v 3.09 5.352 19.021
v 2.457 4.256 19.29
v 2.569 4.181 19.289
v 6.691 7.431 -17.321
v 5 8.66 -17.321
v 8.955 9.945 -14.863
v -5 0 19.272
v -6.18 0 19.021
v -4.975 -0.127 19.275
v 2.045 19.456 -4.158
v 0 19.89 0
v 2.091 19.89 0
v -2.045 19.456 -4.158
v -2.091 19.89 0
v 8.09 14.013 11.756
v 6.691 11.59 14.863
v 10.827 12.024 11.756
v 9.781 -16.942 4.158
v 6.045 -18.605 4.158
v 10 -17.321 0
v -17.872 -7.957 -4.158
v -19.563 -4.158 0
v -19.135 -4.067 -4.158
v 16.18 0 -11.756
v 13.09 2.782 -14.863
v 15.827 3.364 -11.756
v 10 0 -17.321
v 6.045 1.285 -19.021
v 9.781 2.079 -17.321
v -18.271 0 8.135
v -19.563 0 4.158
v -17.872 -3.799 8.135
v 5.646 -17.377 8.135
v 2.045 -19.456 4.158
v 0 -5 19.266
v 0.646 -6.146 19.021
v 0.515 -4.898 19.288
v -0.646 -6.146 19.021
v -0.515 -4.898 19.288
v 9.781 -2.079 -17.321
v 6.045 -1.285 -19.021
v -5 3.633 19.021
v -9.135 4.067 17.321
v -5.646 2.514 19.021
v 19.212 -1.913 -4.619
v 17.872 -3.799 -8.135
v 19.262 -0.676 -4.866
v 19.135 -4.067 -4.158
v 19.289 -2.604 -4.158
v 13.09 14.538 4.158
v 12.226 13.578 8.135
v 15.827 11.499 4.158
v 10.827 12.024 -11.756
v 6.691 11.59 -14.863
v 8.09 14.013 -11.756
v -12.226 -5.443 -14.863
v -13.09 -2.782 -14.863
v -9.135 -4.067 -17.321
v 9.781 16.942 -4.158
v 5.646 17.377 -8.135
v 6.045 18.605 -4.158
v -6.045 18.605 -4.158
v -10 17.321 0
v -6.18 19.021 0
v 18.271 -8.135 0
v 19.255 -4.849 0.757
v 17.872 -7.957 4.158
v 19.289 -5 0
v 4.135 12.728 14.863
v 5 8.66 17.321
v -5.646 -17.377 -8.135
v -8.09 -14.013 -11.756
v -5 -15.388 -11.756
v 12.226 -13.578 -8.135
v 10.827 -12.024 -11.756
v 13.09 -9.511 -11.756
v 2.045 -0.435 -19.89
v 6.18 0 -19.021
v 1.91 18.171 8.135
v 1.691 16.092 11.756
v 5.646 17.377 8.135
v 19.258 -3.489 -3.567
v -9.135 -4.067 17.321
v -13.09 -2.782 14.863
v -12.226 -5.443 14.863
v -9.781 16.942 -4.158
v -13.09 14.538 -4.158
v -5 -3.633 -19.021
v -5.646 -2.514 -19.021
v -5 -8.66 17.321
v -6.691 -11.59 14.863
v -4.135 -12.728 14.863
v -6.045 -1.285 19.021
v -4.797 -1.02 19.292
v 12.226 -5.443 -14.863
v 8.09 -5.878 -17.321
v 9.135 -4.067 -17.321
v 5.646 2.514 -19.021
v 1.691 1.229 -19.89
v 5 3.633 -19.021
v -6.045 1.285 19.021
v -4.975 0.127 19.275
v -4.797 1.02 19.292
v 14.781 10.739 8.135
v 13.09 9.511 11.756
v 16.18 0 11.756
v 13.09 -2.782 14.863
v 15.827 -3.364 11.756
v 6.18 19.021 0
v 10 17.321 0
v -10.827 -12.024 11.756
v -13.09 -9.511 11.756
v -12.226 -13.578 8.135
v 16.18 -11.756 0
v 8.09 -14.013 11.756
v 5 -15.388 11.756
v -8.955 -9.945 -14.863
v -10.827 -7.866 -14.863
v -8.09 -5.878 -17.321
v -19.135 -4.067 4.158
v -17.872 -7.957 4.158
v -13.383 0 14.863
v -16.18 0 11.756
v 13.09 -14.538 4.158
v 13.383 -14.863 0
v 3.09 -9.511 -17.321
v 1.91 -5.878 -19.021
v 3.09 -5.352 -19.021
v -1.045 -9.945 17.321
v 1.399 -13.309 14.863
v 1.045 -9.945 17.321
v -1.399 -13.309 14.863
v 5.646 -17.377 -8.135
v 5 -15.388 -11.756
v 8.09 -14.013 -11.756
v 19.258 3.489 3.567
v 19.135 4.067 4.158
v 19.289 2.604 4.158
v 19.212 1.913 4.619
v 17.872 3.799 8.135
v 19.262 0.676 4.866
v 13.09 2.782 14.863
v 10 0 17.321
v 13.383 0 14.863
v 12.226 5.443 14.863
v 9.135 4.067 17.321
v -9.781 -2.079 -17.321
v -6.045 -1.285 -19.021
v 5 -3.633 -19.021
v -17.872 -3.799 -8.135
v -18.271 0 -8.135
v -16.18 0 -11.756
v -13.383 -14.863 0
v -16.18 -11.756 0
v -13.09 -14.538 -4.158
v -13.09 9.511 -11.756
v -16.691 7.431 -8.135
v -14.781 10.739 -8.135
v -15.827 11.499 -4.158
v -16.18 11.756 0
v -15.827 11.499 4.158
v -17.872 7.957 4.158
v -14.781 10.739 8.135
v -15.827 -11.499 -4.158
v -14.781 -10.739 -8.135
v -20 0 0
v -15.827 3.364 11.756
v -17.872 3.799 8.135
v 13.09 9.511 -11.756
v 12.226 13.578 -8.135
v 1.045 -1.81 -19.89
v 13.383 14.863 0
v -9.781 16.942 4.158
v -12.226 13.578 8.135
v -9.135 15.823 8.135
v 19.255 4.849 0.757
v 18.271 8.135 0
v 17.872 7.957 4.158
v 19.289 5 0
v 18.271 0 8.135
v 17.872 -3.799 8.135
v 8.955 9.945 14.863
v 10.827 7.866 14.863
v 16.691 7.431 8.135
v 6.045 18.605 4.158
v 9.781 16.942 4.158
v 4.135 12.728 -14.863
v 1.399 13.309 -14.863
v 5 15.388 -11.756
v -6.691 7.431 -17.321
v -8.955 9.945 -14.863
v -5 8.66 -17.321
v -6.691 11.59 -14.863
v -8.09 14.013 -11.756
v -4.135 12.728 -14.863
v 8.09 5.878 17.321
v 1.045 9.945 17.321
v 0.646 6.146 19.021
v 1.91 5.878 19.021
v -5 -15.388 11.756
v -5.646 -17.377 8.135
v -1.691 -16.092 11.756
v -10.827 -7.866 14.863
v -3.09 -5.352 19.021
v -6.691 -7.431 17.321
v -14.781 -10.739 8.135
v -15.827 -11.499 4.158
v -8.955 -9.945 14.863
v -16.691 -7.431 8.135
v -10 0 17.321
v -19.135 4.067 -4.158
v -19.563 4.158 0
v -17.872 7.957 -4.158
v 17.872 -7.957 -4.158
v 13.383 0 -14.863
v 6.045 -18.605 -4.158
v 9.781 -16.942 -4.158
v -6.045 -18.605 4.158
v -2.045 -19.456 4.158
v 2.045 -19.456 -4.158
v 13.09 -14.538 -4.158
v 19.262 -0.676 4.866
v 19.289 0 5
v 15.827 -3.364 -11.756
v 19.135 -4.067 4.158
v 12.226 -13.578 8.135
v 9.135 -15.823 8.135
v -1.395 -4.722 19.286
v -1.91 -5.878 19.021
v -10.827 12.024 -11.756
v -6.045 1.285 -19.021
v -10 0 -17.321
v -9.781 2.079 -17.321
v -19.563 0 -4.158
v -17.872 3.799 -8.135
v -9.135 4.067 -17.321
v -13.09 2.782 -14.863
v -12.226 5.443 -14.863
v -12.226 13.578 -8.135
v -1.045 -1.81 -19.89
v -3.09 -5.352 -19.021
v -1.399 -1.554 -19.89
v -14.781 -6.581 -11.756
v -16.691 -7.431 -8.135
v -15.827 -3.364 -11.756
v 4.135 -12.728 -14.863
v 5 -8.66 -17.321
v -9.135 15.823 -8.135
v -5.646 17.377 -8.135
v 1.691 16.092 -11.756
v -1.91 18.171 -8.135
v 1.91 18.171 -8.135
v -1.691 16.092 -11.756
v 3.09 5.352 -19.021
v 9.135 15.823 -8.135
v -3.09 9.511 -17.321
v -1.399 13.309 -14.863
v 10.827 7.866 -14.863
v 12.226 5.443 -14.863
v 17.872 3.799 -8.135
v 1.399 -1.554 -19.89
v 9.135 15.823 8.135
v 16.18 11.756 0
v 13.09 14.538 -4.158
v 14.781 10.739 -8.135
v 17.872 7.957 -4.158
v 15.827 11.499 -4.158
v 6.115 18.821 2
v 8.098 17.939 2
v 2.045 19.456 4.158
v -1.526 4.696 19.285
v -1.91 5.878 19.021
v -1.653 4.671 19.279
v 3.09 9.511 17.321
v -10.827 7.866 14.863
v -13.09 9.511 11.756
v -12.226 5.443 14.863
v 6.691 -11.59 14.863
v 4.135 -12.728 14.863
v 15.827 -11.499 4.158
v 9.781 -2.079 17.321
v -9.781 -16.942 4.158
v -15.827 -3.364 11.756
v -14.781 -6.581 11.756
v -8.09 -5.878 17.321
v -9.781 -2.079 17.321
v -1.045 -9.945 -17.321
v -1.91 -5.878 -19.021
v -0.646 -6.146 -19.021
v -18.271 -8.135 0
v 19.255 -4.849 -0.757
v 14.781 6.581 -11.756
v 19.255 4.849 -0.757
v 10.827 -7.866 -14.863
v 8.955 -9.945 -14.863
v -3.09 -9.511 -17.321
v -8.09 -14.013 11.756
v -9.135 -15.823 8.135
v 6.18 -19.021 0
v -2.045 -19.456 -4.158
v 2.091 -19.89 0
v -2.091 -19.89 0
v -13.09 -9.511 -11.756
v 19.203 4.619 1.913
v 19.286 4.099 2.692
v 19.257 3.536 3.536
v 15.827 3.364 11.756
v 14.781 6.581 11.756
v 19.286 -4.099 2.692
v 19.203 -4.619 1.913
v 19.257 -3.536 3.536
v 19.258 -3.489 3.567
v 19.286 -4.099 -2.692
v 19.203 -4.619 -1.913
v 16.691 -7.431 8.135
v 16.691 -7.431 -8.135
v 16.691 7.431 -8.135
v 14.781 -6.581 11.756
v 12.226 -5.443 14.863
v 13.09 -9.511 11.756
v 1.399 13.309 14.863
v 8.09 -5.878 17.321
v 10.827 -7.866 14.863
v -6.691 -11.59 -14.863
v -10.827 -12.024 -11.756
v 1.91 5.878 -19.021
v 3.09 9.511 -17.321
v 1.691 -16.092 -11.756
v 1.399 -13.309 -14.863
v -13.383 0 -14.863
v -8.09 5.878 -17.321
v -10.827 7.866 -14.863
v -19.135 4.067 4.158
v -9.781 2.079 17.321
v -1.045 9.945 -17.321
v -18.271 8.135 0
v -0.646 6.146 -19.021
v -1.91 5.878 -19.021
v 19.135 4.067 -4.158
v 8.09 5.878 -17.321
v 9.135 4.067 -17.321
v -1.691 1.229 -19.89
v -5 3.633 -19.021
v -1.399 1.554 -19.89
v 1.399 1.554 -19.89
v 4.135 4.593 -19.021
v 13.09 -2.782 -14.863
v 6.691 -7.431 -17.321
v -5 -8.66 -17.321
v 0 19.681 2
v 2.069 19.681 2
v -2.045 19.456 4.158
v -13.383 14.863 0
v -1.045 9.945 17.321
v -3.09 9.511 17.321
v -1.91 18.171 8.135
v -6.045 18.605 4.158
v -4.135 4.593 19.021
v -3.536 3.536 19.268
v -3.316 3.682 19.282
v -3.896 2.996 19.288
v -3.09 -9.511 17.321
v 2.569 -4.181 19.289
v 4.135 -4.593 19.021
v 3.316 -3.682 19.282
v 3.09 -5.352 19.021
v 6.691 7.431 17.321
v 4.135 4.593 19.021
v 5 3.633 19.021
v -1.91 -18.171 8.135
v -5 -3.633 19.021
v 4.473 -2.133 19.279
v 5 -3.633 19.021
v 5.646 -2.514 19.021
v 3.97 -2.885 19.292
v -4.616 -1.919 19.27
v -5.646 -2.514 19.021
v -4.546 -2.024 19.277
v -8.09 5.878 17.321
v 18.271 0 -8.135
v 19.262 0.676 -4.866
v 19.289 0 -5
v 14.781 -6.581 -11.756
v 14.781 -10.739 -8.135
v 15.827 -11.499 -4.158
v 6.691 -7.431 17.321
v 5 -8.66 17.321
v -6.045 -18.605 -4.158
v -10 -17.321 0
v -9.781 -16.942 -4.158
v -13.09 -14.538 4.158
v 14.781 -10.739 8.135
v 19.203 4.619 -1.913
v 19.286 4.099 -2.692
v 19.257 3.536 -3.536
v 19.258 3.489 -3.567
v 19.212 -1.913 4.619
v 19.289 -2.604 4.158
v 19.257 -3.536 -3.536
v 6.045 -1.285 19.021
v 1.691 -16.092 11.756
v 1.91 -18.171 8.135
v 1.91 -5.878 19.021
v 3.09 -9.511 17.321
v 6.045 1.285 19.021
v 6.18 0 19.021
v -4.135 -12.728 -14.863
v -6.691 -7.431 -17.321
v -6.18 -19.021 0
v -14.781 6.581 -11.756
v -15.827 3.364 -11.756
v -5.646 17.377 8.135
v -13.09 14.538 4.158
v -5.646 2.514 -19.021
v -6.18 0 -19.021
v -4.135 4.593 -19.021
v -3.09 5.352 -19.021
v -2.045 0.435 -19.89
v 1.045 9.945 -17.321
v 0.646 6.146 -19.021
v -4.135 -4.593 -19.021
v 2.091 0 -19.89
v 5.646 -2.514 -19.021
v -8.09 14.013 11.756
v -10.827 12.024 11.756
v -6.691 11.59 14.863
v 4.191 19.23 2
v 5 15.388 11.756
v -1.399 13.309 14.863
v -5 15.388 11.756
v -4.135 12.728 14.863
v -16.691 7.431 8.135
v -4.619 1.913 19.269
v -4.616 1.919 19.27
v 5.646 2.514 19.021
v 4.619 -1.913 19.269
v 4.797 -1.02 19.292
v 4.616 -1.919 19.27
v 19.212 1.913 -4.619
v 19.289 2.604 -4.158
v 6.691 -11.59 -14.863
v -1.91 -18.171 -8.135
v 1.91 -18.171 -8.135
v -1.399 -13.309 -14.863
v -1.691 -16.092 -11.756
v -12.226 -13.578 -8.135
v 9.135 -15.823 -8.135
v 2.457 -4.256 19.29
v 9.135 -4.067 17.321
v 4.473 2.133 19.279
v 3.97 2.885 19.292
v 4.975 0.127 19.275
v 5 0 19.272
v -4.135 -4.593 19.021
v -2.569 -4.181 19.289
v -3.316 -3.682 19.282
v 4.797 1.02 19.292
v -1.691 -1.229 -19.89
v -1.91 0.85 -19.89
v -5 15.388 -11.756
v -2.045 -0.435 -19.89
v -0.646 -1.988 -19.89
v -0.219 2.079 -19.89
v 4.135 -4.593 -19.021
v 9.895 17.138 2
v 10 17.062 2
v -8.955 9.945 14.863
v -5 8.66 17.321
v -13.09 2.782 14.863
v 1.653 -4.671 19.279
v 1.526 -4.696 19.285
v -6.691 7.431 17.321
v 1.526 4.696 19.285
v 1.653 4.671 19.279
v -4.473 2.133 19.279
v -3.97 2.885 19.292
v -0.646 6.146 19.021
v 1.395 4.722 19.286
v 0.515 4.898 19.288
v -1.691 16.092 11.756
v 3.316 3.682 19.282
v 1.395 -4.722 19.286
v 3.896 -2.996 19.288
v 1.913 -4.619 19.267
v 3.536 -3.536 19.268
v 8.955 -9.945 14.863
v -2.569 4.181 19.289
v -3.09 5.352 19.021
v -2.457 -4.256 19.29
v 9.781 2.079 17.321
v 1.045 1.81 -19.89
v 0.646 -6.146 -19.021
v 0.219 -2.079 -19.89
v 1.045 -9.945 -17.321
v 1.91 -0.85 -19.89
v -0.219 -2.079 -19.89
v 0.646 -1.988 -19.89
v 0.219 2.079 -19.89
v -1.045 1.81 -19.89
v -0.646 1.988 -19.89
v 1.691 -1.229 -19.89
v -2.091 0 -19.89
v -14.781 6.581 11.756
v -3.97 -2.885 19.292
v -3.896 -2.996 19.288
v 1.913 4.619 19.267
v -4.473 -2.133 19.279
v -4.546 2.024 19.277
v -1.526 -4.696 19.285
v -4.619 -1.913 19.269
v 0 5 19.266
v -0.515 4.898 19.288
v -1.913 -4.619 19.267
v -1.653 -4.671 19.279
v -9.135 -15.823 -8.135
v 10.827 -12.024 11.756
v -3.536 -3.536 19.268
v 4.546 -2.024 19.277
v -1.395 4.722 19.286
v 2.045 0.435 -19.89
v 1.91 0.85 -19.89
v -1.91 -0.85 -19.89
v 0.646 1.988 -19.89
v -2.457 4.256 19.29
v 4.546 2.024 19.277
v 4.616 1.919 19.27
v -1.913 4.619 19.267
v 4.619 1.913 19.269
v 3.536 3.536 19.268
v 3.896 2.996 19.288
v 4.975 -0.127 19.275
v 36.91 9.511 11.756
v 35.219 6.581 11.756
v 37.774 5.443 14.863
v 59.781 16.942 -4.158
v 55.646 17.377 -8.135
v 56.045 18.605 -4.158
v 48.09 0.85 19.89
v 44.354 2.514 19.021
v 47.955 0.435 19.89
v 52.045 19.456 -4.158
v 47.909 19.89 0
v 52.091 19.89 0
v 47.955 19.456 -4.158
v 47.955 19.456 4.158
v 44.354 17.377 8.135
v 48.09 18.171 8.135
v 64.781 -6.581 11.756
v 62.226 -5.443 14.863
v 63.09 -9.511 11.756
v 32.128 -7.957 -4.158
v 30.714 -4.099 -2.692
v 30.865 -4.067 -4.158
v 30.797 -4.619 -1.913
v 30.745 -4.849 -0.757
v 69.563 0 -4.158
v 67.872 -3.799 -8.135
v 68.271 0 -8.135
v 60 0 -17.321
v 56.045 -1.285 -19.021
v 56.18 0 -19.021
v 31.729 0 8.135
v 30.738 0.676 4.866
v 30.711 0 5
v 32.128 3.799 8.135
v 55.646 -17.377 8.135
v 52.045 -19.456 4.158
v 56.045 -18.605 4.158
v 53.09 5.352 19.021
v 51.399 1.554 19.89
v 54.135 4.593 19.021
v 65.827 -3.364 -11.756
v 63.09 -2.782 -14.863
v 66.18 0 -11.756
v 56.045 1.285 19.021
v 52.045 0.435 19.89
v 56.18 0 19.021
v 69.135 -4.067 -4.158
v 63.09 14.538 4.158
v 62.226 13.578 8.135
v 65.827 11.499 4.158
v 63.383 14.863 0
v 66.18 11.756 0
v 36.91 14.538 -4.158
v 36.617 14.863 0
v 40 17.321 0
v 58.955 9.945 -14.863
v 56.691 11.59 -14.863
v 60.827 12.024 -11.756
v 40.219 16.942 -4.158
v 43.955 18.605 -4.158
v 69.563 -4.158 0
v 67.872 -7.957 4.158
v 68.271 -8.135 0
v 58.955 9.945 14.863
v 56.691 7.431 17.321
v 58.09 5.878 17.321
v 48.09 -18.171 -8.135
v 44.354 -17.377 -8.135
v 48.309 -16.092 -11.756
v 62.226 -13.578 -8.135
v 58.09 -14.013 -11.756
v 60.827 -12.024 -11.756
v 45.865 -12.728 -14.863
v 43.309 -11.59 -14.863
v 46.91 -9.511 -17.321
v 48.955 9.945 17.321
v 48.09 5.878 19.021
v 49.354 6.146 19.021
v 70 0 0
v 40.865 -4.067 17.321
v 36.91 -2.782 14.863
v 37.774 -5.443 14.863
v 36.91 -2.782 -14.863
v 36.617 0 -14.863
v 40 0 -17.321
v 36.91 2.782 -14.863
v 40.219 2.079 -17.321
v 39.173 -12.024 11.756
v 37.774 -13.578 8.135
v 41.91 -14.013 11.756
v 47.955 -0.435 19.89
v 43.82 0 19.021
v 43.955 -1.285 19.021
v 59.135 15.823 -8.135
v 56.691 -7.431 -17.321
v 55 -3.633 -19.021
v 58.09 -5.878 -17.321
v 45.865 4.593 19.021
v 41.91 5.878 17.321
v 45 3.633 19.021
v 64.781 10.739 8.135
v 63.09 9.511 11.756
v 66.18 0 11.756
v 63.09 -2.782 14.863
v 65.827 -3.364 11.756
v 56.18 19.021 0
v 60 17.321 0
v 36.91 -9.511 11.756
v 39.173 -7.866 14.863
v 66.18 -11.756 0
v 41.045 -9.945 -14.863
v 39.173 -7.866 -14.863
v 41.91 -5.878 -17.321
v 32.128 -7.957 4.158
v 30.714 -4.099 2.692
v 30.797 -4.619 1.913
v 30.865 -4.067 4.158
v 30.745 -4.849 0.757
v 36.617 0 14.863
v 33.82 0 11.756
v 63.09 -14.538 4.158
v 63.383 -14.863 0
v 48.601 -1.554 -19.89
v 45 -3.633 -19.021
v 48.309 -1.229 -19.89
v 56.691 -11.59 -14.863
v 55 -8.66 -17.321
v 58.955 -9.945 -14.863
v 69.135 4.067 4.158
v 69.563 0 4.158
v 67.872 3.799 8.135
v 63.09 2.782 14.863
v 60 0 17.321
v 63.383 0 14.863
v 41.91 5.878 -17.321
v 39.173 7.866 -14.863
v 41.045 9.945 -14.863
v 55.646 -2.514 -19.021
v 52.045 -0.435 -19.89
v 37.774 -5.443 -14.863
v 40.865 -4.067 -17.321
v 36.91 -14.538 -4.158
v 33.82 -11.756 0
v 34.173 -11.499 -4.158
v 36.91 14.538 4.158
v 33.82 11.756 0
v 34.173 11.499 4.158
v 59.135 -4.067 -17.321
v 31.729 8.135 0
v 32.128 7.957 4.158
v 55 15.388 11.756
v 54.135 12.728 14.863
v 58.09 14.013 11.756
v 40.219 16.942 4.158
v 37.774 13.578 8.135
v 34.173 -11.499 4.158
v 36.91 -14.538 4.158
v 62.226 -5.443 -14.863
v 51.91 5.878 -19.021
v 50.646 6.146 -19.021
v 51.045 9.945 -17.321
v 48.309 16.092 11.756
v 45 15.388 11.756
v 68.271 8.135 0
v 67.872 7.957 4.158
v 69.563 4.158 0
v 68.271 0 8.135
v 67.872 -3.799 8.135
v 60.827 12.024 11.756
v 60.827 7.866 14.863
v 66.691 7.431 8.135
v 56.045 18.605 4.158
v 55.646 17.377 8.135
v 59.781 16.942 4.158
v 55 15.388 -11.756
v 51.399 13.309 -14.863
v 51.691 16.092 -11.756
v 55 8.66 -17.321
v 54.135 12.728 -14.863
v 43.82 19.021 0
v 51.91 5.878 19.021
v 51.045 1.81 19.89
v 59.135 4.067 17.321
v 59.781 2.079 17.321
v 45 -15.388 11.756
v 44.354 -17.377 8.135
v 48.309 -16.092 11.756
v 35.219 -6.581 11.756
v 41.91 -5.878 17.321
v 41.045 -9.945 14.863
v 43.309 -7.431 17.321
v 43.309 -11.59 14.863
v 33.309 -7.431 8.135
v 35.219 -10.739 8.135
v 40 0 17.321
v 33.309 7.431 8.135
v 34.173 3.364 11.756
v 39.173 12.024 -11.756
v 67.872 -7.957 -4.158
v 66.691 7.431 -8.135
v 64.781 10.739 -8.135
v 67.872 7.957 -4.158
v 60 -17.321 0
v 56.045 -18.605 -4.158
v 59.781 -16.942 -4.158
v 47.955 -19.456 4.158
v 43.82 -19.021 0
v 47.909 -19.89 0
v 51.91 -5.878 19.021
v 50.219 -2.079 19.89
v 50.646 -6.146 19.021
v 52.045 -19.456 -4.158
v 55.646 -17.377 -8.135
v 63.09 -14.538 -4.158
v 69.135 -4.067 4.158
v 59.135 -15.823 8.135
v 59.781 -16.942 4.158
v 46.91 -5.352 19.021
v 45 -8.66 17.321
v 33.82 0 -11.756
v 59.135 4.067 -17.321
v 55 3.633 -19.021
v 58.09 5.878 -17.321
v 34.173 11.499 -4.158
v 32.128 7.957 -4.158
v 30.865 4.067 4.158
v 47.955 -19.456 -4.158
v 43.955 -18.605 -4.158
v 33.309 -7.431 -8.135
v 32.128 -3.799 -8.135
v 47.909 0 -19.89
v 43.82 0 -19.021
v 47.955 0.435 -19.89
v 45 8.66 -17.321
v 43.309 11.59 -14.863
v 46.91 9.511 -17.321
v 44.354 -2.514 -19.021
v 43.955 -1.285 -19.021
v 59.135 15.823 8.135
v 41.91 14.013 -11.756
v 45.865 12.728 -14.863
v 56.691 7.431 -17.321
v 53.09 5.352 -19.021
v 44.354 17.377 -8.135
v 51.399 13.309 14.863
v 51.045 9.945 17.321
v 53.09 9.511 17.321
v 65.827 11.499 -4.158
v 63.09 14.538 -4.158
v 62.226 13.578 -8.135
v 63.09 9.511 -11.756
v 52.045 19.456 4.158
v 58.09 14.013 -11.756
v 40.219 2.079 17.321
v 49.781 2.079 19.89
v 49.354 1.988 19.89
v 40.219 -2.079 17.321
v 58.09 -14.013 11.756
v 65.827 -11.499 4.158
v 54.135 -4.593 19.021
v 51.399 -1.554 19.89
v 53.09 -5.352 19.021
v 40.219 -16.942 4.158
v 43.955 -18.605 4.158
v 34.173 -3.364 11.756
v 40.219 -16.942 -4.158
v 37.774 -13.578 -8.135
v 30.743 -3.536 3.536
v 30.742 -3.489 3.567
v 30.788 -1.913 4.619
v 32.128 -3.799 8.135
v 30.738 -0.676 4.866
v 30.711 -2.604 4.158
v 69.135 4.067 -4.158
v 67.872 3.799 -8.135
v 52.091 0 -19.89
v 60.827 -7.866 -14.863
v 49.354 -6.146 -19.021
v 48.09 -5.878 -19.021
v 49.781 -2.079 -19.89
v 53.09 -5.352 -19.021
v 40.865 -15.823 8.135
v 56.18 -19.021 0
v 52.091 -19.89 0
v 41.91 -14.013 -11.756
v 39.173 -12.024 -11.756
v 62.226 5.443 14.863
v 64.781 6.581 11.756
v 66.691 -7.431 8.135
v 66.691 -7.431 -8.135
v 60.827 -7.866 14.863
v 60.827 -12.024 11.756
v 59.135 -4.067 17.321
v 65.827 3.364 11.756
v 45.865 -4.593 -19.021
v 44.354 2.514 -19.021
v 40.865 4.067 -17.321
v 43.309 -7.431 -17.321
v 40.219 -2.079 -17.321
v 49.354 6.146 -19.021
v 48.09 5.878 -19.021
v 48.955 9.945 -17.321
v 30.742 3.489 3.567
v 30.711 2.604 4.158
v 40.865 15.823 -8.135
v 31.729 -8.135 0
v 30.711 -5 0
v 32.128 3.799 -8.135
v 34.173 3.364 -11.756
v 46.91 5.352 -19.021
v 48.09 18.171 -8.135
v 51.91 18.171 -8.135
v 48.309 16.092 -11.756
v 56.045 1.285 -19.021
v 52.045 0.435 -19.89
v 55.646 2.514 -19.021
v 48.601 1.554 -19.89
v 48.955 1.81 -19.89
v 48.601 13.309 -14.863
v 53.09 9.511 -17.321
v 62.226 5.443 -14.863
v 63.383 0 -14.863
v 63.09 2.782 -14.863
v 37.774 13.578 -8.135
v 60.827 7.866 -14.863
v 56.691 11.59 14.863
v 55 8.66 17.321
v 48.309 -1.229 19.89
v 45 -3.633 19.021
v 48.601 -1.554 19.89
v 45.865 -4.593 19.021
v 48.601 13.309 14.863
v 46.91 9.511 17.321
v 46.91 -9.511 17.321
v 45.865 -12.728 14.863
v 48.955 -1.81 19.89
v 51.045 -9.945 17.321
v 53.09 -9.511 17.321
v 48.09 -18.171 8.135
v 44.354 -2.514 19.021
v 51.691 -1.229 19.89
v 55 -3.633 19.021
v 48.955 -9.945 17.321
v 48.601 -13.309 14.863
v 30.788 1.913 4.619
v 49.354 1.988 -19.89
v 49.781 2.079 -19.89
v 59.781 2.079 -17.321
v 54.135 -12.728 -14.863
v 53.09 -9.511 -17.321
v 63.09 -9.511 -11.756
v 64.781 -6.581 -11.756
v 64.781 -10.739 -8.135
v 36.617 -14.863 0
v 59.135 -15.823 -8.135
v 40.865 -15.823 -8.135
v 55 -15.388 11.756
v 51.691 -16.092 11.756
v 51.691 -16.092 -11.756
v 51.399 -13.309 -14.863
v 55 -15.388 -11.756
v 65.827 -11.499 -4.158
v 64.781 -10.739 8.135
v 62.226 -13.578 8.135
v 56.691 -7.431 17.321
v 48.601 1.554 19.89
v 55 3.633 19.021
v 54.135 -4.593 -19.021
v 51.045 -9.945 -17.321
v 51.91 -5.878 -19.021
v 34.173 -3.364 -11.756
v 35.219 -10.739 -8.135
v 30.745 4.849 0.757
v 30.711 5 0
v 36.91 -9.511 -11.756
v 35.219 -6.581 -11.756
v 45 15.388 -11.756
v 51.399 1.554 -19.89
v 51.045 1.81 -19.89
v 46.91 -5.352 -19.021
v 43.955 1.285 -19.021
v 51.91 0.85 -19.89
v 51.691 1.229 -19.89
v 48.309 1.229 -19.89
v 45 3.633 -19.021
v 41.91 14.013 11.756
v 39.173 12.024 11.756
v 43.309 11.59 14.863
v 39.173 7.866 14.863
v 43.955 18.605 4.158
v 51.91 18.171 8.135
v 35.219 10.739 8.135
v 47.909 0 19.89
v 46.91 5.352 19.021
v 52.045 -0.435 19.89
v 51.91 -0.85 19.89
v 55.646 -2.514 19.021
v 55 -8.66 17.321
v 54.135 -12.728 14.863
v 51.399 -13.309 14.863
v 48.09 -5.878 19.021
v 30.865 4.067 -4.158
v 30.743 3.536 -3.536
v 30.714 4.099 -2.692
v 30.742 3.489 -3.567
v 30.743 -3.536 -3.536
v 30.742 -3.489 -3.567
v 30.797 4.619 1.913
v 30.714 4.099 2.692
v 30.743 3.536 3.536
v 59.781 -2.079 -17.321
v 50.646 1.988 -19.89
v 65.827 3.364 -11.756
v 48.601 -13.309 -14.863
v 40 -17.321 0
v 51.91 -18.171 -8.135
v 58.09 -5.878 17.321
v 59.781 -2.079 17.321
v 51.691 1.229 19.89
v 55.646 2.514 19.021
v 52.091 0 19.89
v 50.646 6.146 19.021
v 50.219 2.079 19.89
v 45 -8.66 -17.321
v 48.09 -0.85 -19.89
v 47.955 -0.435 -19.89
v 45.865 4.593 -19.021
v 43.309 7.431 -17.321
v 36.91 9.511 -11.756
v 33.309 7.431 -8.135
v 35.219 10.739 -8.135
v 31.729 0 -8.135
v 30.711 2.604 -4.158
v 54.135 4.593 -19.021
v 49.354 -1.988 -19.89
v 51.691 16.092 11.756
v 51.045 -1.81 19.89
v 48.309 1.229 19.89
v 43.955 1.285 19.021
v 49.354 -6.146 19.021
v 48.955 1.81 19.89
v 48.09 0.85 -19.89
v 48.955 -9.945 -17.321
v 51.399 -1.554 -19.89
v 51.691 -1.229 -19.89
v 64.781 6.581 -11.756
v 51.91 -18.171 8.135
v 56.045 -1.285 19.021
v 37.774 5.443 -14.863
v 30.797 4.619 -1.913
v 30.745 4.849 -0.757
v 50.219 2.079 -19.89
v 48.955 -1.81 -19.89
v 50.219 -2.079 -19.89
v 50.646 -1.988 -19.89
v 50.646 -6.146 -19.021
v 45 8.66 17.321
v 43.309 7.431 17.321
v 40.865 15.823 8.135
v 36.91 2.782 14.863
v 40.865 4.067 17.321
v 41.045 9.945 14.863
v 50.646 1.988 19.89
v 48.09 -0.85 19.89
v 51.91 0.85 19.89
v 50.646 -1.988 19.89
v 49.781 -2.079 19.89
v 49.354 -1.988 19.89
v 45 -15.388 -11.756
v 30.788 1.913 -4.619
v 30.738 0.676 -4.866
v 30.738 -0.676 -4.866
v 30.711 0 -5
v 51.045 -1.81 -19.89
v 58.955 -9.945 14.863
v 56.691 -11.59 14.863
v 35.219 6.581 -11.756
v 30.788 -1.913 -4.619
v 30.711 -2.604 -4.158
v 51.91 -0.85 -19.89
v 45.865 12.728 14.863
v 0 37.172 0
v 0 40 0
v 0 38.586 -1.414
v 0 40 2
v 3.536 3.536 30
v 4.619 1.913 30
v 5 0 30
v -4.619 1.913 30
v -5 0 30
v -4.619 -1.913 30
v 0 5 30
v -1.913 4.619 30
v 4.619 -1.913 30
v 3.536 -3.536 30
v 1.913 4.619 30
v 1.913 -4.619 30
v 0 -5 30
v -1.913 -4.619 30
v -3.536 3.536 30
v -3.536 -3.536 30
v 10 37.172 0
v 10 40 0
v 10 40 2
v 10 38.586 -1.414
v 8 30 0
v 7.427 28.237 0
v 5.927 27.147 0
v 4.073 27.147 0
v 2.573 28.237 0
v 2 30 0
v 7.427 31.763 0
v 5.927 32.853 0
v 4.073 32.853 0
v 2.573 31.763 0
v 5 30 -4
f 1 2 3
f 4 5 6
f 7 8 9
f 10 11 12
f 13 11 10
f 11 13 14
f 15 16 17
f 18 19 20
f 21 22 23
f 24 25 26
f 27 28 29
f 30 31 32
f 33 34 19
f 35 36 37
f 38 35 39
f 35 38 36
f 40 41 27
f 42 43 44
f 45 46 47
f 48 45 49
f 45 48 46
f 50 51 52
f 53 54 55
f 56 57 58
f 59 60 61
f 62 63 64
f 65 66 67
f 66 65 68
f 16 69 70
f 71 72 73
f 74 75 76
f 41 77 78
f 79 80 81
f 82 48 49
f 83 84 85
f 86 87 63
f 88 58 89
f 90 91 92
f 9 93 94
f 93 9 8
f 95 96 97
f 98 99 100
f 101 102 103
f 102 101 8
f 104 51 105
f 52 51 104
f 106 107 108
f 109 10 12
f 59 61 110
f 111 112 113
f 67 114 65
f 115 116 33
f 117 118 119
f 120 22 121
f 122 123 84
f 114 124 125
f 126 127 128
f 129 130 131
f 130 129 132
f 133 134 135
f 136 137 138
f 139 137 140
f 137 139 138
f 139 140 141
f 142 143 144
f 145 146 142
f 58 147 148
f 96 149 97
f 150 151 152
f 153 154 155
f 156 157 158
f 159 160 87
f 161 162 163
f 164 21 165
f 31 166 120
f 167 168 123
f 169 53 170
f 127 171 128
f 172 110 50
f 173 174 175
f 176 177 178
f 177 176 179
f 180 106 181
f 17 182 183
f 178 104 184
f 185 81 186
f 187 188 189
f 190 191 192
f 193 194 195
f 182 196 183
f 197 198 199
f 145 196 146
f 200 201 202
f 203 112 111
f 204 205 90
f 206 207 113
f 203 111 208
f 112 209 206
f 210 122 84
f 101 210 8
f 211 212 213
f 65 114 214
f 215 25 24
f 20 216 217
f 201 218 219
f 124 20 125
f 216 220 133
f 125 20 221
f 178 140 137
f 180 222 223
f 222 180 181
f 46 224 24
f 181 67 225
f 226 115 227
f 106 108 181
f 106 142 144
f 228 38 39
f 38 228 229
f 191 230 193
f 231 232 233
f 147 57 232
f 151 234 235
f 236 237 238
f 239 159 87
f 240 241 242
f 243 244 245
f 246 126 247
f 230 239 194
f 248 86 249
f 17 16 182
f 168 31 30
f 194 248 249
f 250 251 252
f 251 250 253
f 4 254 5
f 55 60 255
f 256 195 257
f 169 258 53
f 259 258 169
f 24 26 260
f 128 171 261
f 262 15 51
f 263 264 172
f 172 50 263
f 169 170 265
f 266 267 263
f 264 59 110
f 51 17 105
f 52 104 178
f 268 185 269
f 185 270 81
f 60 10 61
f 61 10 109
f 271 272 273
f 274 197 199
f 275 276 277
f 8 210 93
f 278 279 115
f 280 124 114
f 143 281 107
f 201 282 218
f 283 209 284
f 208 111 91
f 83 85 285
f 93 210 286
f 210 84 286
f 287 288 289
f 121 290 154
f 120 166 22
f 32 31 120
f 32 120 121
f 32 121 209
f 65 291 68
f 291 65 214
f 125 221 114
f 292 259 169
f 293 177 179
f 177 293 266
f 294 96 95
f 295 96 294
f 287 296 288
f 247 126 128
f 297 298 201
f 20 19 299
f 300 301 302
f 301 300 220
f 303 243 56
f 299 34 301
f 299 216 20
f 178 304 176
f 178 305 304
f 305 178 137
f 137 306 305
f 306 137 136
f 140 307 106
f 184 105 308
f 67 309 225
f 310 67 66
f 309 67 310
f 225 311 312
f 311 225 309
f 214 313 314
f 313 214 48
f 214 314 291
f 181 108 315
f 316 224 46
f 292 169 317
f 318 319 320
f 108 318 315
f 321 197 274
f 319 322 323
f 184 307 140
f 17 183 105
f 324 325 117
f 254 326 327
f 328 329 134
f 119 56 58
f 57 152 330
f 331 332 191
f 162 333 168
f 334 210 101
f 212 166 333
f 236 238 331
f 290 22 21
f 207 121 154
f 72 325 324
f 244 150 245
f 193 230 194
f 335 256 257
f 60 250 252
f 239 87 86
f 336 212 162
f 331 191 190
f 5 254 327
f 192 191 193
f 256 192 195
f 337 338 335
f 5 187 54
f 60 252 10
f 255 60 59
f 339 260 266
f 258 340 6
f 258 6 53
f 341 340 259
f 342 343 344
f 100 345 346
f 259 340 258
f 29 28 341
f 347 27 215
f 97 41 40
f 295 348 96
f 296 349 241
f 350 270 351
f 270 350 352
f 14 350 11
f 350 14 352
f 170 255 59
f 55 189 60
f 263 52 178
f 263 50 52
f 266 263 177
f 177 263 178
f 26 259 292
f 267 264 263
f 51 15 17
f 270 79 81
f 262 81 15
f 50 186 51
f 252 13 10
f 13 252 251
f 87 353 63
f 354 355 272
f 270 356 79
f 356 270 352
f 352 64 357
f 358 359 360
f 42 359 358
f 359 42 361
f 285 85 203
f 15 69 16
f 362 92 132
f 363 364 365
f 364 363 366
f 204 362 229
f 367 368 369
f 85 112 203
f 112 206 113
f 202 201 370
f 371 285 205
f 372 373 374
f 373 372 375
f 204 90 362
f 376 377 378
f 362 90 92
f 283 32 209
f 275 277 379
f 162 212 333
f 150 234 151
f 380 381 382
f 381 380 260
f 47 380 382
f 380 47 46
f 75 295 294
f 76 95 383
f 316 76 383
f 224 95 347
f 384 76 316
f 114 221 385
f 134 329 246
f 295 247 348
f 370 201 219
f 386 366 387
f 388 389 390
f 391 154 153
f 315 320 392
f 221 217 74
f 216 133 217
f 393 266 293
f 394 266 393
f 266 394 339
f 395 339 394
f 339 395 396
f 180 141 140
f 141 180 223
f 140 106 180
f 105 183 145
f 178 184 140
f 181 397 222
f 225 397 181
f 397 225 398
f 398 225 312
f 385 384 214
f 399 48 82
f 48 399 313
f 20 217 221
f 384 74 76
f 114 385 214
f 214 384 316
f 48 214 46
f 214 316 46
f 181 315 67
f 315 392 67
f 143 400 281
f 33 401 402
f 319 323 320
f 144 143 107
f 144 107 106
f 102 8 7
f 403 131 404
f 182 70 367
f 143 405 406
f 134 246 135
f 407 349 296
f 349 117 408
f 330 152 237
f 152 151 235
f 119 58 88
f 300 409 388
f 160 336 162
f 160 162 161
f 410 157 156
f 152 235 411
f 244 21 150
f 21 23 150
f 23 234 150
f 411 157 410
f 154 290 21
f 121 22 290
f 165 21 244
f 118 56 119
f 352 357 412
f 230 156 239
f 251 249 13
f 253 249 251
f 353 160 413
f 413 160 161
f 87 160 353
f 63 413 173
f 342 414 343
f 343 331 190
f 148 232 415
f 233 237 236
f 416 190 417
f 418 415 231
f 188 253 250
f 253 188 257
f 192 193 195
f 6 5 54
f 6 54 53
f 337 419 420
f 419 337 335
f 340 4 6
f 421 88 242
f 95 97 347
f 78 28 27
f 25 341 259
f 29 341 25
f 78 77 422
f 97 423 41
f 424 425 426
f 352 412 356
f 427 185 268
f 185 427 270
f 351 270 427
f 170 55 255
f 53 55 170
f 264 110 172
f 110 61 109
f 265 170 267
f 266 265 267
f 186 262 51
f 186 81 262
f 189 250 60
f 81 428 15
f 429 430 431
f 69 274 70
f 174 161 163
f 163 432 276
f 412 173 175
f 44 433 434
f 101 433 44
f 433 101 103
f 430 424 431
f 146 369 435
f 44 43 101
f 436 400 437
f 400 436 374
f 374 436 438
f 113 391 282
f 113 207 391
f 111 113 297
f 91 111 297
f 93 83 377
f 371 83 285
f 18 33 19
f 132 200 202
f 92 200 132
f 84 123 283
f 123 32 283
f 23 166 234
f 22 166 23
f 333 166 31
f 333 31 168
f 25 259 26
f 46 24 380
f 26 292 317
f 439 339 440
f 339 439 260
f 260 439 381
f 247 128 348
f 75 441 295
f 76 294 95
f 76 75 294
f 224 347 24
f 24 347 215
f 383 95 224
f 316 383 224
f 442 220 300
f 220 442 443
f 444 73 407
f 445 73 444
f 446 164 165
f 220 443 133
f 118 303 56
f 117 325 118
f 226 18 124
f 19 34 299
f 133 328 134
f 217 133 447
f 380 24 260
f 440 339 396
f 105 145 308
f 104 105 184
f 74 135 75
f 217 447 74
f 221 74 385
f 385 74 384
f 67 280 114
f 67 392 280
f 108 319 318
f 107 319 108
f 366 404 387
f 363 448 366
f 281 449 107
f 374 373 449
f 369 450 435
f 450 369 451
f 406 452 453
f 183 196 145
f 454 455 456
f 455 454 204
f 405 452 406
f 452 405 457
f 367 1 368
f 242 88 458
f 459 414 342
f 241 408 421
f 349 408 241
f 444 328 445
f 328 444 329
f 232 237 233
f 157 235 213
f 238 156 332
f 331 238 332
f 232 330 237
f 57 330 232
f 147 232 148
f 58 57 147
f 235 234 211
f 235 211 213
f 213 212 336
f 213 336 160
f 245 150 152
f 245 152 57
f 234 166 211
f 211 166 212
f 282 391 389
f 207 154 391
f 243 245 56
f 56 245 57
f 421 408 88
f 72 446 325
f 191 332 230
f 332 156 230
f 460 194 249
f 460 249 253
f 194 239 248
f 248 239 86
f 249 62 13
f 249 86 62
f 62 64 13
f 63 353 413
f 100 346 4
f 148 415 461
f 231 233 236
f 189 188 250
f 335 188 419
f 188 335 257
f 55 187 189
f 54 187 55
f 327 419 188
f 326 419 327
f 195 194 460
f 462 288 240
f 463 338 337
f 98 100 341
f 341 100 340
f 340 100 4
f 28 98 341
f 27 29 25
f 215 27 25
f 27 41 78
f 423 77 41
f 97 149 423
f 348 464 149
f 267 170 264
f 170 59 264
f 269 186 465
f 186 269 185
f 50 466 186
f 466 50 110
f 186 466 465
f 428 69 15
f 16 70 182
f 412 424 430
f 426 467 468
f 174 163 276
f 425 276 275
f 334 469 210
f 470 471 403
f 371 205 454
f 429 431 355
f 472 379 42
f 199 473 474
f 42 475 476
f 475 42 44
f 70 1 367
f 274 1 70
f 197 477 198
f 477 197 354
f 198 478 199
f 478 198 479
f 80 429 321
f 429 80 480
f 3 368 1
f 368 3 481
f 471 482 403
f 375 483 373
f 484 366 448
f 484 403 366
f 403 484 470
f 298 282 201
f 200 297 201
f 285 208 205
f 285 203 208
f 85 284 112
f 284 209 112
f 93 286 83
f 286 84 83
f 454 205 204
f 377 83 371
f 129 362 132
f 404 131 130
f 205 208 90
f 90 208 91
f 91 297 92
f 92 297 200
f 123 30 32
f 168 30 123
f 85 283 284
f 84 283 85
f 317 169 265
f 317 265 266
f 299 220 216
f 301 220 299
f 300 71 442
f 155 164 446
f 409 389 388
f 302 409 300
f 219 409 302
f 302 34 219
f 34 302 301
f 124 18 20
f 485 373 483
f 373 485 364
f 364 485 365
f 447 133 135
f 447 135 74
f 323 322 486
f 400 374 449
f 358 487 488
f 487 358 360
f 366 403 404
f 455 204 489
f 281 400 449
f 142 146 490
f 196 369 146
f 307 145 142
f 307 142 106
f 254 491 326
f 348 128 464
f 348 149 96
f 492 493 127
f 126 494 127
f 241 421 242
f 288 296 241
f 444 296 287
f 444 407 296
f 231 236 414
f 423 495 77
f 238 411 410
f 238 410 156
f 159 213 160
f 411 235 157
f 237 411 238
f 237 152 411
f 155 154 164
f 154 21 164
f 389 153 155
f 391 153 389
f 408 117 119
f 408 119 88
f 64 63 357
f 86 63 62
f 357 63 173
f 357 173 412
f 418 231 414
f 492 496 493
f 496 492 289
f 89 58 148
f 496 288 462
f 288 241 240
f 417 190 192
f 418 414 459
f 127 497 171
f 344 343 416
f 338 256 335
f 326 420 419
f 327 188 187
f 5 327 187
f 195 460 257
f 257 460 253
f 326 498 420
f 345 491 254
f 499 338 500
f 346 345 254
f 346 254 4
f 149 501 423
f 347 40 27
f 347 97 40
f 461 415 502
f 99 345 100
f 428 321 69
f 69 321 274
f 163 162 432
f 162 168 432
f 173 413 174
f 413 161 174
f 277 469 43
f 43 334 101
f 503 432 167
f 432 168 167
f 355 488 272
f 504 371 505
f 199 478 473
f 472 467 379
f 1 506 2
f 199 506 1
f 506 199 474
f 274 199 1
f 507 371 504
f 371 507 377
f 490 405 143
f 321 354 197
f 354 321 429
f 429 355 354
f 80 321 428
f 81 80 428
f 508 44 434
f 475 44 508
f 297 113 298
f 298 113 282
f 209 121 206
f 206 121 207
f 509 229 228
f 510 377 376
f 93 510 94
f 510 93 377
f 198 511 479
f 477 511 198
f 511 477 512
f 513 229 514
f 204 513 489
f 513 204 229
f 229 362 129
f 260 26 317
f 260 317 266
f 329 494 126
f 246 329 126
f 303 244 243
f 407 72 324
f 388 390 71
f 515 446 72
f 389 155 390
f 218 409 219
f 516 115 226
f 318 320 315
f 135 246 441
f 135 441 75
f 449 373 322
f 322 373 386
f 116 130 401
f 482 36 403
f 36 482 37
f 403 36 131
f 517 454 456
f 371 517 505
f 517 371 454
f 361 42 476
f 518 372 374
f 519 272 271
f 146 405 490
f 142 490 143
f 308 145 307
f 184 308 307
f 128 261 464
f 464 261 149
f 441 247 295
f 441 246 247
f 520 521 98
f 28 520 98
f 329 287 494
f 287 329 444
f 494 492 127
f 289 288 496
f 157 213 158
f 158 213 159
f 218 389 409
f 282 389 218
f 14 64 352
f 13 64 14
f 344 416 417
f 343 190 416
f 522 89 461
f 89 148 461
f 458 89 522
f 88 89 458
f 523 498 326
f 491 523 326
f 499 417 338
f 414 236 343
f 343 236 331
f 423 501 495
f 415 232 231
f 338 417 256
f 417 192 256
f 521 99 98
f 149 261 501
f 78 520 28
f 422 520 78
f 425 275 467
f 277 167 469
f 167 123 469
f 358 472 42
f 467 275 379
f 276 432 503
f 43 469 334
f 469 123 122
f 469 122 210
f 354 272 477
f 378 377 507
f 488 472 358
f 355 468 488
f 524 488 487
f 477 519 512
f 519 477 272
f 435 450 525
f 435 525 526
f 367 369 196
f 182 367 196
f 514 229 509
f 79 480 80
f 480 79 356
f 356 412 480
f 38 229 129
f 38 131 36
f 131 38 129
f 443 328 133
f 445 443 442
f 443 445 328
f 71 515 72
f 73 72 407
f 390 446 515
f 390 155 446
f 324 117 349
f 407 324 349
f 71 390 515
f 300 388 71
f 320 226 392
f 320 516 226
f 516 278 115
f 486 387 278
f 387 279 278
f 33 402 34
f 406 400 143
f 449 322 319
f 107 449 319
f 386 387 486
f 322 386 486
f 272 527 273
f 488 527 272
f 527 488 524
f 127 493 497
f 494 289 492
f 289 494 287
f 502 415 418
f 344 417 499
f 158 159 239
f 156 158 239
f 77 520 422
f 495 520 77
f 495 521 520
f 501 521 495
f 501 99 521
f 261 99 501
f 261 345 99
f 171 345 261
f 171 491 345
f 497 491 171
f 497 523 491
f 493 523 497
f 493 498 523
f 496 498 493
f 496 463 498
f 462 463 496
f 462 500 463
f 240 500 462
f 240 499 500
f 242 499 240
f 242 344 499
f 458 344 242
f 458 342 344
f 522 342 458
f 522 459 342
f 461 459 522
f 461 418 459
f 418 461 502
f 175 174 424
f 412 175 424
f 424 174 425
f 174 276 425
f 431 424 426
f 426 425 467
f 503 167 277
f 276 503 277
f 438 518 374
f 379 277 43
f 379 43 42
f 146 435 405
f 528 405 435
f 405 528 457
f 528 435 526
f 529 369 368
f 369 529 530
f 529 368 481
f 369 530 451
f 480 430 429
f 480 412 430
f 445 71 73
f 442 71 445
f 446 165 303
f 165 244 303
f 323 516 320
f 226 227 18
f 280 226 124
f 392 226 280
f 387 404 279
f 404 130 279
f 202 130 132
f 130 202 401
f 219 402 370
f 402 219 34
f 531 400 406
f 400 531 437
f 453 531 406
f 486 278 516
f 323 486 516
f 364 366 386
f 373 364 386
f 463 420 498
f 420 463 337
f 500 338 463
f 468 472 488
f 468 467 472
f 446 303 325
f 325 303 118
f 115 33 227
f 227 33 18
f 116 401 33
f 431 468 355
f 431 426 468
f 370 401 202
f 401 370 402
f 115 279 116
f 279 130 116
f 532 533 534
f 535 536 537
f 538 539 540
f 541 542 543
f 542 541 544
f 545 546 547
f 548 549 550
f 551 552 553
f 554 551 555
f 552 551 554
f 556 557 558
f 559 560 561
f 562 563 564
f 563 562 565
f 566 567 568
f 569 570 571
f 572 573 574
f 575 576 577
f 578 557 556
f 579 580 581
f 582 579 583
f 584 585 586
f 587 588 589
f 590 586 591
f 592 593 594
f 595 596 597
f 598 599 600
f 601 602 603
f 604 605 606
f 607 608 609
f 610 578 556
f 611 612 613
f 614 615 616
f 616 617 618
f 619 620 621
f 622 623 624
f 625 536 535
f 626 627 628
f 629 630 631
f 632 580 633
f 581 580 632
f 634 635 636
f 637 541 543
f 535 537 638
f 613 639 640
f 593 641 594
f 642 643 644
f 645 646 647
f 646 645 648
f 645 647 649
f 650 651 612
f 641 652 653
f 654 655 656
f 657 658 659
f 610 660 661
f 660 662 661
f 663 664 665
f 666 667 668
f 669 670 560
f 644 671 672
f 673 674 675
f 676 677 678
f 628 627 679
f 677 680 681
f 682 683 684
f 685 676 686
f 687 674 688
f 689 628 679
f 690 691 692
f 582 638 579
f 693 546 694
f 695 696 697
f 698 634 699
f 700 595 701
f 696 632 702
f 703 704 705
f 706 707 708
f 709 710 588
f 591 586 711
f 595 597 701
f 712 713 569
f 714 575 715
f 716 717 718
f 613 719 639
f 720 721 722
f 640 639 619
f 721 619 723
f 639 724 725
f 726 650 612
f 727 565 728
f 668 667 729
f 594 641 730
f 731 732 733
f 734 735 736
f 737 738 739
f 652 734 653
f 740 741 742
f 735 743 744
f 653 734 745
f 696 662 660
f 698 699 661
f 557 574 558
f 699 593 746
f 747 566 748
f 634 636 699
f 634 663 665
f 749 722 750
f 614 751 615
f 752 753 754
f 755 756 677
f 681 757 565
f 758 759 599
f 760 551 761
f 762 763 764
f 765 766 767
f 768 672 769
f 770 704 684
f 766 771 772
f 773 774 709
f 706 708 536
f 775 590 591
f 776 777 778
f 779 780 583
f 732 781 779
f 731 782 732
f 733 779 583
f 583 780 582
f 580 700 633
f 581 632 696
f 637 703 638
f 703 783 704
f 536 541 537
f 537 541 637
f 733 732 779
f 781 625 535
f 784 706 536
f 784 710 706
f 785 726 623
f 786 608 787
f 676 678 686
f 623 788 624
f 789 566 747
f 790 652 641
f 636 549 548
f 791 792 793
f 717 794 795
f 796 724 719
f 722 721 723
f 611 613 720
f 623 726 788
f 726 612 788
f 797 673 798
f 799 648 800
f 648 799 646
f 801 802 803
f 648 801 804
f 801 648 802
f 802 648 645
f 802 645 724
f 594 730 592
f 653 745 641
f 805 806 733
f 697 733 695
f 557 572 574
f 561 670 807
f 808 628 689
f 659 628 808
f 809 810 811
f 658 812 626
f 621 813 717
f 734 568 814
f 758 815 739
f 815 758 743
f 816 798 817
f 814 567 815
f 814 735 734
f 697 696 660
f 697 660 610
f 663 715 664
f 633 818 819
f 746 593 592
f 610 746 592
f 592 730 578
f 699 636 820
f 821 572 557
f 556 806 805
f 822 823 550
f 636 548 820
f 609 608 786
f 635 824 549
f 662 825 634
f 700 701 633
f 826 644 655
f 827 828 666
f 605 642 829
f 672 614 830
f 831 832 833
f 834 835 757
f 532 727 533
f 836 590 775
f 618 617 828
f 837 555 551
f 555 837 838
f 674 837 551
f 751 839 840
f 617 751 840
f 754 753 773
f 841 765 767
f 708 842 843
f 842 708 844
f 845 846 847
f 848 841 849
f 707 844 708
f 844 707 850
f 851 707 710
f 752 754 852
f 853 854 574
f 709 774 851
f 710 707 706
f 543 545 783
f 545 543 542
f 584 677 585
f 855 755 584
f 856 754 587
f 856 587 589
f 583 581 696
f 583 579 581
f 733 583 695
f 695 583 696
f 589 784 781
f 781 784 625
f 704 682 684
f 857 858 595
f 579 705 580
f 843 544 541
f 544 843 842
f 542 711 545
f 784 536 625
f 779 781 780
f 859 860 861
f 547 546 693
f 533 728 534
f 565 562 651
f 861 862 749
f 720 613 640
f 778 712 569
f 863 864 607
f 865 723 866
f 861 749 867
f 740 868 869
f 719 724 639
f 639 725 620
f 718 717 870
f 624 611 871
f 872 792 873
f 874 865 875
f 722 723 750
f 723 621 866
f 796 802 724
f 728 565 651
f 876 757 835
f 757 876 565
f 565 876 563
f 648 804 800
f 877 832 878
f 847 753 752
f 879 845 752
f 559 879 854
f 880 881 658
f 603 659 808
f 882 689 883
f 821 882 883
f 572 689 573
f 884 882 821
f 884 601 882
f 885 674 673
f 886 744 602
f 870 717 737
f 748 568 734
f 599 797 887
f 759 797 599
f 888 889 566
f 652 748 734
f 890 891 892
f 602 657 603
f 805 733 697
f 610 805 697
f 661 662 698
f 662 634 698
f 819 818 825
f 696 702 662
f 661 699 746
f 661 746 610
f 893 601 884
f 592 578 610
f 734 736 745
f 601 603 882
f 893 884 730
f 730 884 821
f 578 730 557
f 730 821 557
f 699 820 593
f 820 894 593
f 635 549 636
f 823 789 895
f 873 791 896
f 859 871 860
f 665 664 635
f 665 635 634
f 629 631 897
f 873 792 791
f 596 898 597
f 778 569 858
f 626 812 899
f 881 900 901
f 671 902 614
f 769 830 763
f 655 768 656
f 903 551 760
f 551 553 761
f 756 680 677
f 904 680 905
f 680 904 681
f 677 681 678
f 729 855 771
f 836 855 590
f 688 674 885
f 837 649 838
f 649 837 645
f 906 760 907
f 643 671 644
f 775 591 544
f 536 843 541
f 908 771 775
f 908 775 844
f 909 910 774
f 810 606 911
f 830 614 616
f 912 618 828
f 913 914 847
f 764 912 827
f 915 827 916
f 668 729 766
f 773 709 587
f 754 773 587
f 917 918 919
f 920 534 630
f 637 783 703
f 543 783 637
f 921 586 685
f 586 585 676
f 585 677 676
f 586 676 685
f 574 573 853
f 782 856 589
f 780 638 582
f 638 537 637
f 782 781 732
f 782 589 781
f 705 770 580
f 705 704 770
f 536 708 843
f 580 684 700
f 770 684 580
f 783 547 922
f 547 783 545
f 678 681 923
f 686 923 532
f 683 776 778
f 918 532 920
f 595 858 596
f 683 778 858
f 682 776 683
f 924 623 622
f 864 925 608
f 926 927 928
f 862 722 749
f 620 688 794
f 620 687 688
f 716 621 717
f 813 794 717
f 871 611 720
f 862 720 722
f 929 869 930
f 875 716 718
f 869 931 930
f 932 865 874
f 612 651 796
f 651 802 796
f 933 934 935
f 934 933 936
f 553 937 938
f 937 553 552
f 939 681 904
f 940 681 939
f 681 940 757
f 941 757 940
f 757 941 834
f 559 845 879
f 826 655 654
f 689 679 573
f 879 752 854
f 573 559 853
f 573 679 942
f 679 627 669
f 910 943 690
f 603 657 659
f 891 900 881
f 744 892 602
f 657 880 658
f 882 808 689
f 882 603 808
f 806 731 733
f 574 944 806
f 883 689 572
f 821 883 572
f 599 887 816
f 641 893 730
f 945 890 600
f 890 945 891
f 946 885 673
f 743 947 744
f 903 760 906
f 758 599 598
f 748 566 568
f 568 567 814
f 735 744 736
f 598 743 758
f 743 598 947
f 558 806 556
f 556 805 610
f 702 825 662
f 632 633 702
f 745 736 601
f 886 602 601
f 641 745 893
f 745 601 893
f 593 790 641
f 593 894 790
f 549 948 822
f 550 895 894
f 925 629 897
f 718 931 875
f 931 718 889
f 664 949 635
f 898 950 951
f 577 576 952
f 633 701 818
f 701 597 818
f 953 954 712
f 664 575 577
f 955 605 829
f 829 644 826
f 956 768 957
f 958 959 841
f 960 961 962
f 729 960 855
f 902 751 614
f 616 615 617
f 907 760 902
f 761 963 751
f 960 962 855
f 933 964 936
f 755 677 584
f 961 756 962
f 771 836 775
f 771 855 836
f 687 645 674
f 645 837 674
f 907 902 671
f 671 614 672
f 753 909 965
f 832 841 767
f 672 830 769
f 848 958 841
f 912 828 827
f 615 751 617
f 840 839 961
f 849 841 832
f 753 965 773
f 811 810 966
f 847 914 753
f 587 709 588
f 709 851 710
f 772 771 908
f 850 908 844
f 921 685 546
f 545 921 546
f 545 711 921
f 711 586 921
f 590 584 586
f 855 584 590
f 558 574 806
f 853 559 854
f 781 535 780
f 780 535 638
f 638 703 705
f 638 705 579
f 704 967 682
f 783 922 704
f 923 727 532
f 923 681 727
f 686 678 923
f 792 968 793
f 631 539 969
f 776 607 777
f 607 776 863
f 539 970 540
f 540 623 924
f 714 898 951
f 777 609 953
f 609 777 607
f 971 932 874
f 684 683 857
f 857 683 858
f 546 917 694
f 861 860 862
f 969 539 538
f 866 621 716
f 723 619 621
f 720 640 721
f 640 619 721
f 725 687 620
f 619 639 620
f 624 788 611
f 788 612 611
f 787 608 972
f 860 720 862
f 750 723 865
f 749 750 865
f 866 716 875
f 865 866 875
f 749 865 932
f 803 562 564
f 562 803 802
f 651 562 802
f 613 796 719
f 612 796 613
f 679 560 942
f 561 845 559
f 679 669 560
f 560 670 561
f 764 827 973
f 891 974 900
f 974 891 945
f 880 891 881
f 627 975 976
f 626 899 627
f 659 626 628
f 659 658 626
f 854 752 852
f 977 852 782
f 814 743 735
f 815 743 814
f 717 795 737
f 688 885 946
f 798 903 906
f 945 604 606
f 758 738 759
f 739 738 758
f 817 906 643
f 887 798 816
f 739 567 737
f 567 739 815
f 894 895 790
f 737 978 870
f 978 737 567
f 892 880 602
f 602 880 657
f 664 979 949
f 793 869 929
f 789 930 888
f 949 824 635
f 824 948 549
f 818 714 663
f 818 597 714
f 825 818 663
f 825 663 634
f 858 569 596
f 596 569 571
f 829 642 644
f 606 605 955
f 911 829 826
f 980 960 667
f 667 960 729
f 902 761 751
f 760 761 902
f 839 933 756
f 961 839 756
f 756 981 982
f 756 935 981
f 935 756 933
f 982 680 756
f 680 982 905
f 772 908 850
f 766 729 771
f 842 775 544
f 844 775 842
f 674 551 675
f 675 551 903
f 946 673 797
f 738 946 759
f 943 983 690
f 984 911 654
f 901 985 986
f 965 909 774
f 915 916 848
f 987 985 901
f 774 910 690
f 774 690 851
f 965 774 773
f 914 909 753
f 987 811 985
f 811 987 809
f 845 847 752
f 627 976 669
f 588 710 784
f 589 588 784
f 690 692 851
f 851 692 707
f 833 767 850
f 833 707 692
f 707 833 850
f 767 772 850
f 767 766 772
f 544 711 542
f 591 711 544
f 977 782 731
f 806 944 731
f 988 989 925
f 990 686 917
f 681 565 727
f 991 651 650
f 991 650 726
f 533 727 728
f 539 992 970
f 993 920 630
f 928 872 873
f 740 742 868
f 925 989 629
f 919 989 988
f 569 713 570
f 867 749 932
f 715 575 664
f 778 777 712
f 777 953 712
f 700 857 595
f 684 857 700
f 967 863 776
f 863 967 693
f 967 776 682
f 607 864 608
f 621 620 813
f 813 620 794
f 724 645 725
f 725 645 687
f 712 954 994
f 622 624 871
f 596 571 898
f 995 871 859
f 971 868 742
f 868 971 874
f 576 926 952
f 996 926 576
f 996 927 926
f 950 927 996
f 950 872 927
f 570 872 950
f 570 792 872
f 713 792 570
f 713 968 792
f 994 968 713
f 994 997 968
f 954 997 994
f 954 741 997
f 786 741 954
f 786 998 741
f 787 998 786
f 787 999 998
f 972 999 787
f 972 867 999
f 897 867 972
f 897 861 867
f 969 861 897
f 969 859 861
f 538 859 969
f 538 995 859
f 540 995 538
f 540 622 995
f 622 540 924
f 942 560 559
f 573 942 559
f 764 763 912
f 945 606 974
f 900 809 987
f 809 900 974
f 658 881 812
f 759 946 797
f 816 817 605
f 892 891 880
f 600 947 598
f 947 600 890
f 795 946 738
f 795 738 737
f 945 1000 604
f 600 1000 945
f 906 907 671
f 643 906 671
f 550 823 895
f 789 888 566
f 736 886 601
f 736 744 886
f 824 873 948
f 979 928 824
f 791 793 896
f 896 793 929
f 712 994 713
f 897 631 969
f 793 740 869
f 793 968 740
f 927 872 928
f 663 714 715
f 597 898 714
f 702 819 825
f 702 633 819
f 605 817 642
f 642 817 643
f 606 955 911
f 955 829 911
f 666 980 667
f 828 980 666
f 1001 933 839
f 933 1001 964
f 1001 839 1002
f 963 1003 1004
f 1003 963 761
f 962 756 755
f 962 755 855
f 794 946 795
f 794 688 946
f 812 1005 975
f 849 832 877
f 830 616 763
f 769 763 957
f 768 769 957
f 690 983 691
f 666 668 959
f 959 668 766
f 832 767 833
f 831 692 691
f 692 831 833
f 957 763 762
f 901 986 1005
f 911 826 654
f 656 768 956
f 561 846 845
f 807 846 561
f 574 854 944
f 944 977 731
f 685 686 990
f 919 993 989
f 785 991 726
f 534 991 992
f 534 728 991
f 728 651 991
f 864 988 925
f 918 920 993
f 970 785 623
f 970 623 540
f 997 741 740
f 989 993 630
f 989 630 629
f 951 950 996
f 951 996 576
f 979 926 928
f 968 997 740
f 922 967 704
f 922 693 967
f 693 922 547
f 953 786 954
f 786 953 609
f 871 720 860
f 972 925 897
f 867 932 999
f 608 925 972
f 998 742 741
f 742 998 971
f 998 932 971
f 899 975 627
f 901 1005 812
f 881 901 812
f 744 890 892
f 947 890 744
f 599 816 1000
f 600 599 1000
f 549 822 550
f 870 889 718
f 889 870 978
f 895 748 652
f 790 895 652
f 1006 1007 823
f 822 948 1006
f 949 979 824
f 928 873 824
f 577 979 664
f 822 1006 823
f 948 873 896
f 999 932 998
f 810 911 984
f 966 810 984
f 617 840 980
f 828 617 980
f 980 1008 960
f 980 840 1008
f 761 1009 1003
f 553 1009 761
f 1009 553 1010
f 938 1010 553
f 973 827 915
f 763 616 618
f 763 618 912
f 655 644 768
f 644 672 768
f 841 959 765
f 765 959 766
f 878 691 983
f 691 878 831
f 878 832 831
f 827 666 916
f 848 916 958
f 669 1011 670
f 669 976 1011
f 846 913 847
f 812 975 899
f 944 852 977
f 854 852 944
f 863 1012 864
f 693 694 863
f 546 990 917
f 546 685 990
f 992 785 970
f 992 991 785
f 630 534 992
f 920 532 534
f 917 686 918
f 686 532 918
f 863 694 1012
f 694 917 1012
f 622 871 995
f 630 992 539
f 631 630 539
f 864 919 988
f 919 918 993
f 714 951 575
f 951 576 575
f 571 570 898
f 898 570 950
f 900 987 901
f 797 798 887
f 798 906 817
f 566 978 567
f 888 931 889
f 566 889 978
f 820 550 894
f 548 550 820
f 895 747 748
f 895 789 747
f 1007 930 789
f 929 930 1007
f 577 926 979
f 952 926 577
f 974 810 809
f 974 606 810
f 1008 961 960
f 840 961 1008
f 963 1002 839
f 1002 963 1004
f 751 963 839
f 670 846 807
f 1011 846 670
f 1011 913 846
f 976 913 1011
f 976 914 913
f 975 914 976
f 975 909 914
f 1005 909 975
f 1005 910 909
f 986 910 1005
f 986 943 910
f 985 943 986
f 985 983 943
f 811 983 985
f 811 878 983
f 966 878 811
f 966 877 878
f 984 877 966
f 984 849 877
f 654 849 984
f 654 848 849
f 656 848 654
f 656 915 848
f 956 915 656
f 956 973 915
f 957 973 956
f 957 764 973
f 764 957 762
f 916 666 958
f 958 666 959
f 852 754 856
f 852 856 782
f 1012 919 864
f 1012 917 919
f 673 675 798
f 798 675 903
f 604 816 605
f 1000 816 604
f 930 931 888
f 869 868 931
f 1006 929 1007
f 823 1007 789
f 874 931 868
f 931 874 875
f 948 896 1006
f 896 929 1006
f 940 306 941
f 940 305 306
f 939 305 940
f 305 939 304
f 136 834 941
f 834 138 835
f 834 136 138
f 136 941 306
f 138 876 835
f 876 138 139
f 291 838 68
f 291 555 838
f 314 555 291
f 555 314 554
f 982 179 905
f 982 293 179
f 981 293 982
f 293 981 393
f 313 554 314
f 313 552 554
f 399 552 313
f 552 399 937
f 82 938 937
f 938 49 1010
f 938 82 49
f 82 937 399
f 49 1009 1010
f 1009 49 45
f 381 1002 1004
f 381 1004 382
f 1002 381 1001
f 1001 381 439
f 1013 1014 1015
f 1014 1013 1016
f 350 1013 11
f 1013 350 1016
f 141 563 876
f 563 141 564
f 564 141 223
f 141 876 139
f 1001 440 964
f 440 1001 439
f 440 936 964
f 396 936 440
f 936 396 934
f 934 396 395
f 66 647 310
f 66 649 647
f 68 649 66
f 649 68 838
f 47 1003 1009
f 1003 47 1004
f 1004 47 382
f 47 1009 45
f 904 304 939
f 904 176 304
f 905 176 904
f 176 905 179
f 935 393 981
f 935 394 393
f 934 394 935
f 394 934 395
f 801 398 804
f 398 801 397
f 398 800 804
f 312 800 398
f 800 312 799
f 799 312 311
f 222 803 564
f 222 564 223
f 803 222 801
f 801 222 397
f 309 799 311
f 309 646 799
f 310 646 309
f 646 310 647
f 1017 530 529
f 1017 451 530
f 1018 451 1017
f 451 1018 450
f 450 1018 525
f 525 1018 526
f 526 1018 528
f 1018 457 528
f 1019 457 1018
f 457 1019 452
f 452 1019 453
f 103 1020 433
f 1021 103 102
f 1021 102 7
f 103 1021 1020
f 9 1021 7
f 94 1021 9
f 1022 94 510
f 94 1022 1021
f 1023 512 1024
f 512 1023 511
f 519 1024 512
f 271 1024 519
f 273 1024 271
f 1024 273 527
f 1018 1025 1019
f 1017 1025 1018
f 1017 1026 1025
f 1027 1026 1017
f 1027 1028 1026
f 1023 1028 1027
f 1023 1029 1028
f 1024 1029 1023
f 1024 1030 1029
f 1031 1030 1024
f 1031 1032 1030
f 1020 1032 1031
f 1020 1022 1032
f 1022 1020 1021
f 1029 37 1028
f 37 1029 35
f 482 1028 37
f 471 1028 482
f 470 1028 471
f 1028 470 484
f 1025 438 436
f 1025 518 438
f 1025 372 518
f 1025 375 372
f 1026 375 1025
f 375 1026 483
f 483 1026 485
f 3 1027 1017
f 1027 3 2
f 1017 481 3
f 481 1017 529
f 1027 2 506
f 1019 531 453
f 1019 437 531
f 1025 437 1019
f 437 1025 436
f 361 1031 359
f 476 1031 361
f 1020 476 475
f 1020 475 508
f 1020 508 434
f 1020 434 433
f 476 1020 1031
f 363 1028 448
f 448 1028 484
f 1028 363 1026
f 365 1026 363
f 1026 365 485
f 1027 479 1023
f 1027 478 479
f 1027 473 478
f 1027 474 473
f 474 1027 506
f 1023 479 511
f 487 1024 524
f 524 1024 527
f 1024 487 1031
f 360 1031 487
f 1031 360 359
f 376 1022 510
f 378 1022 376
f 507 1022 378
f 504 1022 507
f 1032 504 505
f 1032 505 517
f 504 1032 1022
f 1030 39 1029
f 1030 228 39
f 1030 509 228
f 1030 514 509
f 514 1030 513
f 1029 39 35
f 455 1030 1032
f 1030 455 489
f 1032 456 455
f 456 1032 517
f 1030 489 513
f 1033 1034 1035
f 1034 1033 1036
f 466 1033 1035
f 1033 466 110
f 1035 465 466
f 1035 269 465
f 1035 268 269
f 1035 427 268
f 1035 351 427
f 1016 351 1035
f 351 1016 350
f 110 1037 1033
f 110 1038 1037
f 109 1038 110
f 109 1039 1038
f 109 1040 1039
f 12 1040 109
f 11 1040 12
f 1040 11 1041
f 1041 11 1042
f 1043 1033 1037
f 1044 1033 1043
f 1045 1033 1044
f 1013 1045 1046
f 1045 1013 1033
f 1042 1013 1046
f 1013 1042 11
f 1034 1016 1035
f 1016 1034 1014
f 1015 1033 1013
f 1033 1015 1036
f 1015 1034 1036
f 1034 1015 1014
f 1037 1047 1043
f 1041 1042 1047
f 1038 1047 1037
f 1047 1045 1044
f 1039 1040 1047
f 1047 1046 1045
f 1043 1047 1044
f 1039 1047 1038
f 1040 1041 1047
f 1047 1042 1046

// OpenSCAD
sphere(r=20);
translate([50, 0, 0]) {
	sphere(r=20);
}
rotate([0, 90, 0]) {
	cylinder(r=5, h=50);
}
cylinder(r=5, h=30);
cube([10, 40, 2]);
translate([0, 40 - 2 * sqrt(2), 0]) {
	rotate([-45, 0, 0]) {
		cube([10, 2, 2]);
	}
}
translate([5, 30, -4]) {
	cylinder(r1=0, r2=3, h=4);
}
